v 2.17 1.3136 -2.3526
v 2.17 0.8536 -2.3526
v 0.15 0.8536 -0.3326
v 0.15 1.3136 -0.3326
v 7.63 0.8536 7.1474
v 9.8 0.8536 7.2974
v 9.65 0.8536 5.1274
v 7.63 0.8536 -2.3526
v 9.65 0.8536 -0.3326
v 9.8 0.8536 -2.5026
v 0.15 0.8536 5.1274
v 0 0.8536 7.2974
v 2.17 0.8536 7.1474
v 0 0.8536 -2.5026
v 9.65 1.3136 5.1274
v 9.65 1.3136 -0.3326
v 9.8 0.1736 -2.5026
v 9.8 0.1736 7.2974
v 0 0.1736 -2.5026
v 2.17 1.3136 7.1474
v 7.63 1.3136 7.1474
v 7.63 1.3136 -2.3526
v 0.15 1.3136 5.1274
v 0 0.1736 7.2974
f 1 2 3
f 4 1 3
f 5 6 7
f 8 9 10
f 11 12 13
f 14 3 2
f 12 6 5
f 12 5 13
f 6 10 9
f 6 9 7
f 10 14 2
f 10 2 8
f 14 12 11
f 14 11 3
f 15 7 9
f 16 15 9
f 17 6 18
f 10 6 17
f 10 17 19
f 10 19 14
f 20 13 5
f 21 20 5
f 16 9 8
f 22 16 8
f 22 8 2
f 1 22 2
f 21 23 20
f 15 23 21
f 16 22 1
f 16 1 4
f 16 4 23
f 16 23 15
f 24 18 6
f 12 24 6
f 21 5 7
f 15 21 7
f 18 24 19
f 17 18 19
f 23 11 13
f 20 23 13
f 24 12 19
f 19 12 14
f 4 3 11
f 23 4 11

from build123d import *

# Parameters (mm, degrees)
SKETCH_1_W      = 9.8
SKETCH_1_H      = 0.68
EXTRUDE_1_DEPTH = 9.8
EXTRUDE_2_DEPTH = 0.46


with BuildPart() as part:
    # Эскиз1 → Бобышка-Вытянуть1 (new body)
    with BuildSketch(Plane(origin=(0, 0, 0), x_dir=(0, 0, -1), z_dir=(1, 0, 0))):
        with Locations((-2.397426888, 0.51364793)):
            Rectangle(SKETCH_1_W, SKETCH_1_H)
    extrude(amount=EXTRUDE_1_DEPTH)

    # Эскиз3 → Бобышка-Вытянуть2 (add)
    with BuildSketch(Plane(origin=(0, 0.85364793, 0), x_dir=(1, 0, 0), z_dir=(0, 1, 0))):
        Polygon((7.63, 2.352573112), (2.17, 2.352573112), (0.15, 0.332573112), (0.15, -5.127426888), (2.17, -7.147426888), (7.63, -7.147426888), (9.65, -5.127426888), (9.65, 0.332573112), align=None)
    extrude(amount=EXTRUDE_2_DEPTH)


solid = part.part
